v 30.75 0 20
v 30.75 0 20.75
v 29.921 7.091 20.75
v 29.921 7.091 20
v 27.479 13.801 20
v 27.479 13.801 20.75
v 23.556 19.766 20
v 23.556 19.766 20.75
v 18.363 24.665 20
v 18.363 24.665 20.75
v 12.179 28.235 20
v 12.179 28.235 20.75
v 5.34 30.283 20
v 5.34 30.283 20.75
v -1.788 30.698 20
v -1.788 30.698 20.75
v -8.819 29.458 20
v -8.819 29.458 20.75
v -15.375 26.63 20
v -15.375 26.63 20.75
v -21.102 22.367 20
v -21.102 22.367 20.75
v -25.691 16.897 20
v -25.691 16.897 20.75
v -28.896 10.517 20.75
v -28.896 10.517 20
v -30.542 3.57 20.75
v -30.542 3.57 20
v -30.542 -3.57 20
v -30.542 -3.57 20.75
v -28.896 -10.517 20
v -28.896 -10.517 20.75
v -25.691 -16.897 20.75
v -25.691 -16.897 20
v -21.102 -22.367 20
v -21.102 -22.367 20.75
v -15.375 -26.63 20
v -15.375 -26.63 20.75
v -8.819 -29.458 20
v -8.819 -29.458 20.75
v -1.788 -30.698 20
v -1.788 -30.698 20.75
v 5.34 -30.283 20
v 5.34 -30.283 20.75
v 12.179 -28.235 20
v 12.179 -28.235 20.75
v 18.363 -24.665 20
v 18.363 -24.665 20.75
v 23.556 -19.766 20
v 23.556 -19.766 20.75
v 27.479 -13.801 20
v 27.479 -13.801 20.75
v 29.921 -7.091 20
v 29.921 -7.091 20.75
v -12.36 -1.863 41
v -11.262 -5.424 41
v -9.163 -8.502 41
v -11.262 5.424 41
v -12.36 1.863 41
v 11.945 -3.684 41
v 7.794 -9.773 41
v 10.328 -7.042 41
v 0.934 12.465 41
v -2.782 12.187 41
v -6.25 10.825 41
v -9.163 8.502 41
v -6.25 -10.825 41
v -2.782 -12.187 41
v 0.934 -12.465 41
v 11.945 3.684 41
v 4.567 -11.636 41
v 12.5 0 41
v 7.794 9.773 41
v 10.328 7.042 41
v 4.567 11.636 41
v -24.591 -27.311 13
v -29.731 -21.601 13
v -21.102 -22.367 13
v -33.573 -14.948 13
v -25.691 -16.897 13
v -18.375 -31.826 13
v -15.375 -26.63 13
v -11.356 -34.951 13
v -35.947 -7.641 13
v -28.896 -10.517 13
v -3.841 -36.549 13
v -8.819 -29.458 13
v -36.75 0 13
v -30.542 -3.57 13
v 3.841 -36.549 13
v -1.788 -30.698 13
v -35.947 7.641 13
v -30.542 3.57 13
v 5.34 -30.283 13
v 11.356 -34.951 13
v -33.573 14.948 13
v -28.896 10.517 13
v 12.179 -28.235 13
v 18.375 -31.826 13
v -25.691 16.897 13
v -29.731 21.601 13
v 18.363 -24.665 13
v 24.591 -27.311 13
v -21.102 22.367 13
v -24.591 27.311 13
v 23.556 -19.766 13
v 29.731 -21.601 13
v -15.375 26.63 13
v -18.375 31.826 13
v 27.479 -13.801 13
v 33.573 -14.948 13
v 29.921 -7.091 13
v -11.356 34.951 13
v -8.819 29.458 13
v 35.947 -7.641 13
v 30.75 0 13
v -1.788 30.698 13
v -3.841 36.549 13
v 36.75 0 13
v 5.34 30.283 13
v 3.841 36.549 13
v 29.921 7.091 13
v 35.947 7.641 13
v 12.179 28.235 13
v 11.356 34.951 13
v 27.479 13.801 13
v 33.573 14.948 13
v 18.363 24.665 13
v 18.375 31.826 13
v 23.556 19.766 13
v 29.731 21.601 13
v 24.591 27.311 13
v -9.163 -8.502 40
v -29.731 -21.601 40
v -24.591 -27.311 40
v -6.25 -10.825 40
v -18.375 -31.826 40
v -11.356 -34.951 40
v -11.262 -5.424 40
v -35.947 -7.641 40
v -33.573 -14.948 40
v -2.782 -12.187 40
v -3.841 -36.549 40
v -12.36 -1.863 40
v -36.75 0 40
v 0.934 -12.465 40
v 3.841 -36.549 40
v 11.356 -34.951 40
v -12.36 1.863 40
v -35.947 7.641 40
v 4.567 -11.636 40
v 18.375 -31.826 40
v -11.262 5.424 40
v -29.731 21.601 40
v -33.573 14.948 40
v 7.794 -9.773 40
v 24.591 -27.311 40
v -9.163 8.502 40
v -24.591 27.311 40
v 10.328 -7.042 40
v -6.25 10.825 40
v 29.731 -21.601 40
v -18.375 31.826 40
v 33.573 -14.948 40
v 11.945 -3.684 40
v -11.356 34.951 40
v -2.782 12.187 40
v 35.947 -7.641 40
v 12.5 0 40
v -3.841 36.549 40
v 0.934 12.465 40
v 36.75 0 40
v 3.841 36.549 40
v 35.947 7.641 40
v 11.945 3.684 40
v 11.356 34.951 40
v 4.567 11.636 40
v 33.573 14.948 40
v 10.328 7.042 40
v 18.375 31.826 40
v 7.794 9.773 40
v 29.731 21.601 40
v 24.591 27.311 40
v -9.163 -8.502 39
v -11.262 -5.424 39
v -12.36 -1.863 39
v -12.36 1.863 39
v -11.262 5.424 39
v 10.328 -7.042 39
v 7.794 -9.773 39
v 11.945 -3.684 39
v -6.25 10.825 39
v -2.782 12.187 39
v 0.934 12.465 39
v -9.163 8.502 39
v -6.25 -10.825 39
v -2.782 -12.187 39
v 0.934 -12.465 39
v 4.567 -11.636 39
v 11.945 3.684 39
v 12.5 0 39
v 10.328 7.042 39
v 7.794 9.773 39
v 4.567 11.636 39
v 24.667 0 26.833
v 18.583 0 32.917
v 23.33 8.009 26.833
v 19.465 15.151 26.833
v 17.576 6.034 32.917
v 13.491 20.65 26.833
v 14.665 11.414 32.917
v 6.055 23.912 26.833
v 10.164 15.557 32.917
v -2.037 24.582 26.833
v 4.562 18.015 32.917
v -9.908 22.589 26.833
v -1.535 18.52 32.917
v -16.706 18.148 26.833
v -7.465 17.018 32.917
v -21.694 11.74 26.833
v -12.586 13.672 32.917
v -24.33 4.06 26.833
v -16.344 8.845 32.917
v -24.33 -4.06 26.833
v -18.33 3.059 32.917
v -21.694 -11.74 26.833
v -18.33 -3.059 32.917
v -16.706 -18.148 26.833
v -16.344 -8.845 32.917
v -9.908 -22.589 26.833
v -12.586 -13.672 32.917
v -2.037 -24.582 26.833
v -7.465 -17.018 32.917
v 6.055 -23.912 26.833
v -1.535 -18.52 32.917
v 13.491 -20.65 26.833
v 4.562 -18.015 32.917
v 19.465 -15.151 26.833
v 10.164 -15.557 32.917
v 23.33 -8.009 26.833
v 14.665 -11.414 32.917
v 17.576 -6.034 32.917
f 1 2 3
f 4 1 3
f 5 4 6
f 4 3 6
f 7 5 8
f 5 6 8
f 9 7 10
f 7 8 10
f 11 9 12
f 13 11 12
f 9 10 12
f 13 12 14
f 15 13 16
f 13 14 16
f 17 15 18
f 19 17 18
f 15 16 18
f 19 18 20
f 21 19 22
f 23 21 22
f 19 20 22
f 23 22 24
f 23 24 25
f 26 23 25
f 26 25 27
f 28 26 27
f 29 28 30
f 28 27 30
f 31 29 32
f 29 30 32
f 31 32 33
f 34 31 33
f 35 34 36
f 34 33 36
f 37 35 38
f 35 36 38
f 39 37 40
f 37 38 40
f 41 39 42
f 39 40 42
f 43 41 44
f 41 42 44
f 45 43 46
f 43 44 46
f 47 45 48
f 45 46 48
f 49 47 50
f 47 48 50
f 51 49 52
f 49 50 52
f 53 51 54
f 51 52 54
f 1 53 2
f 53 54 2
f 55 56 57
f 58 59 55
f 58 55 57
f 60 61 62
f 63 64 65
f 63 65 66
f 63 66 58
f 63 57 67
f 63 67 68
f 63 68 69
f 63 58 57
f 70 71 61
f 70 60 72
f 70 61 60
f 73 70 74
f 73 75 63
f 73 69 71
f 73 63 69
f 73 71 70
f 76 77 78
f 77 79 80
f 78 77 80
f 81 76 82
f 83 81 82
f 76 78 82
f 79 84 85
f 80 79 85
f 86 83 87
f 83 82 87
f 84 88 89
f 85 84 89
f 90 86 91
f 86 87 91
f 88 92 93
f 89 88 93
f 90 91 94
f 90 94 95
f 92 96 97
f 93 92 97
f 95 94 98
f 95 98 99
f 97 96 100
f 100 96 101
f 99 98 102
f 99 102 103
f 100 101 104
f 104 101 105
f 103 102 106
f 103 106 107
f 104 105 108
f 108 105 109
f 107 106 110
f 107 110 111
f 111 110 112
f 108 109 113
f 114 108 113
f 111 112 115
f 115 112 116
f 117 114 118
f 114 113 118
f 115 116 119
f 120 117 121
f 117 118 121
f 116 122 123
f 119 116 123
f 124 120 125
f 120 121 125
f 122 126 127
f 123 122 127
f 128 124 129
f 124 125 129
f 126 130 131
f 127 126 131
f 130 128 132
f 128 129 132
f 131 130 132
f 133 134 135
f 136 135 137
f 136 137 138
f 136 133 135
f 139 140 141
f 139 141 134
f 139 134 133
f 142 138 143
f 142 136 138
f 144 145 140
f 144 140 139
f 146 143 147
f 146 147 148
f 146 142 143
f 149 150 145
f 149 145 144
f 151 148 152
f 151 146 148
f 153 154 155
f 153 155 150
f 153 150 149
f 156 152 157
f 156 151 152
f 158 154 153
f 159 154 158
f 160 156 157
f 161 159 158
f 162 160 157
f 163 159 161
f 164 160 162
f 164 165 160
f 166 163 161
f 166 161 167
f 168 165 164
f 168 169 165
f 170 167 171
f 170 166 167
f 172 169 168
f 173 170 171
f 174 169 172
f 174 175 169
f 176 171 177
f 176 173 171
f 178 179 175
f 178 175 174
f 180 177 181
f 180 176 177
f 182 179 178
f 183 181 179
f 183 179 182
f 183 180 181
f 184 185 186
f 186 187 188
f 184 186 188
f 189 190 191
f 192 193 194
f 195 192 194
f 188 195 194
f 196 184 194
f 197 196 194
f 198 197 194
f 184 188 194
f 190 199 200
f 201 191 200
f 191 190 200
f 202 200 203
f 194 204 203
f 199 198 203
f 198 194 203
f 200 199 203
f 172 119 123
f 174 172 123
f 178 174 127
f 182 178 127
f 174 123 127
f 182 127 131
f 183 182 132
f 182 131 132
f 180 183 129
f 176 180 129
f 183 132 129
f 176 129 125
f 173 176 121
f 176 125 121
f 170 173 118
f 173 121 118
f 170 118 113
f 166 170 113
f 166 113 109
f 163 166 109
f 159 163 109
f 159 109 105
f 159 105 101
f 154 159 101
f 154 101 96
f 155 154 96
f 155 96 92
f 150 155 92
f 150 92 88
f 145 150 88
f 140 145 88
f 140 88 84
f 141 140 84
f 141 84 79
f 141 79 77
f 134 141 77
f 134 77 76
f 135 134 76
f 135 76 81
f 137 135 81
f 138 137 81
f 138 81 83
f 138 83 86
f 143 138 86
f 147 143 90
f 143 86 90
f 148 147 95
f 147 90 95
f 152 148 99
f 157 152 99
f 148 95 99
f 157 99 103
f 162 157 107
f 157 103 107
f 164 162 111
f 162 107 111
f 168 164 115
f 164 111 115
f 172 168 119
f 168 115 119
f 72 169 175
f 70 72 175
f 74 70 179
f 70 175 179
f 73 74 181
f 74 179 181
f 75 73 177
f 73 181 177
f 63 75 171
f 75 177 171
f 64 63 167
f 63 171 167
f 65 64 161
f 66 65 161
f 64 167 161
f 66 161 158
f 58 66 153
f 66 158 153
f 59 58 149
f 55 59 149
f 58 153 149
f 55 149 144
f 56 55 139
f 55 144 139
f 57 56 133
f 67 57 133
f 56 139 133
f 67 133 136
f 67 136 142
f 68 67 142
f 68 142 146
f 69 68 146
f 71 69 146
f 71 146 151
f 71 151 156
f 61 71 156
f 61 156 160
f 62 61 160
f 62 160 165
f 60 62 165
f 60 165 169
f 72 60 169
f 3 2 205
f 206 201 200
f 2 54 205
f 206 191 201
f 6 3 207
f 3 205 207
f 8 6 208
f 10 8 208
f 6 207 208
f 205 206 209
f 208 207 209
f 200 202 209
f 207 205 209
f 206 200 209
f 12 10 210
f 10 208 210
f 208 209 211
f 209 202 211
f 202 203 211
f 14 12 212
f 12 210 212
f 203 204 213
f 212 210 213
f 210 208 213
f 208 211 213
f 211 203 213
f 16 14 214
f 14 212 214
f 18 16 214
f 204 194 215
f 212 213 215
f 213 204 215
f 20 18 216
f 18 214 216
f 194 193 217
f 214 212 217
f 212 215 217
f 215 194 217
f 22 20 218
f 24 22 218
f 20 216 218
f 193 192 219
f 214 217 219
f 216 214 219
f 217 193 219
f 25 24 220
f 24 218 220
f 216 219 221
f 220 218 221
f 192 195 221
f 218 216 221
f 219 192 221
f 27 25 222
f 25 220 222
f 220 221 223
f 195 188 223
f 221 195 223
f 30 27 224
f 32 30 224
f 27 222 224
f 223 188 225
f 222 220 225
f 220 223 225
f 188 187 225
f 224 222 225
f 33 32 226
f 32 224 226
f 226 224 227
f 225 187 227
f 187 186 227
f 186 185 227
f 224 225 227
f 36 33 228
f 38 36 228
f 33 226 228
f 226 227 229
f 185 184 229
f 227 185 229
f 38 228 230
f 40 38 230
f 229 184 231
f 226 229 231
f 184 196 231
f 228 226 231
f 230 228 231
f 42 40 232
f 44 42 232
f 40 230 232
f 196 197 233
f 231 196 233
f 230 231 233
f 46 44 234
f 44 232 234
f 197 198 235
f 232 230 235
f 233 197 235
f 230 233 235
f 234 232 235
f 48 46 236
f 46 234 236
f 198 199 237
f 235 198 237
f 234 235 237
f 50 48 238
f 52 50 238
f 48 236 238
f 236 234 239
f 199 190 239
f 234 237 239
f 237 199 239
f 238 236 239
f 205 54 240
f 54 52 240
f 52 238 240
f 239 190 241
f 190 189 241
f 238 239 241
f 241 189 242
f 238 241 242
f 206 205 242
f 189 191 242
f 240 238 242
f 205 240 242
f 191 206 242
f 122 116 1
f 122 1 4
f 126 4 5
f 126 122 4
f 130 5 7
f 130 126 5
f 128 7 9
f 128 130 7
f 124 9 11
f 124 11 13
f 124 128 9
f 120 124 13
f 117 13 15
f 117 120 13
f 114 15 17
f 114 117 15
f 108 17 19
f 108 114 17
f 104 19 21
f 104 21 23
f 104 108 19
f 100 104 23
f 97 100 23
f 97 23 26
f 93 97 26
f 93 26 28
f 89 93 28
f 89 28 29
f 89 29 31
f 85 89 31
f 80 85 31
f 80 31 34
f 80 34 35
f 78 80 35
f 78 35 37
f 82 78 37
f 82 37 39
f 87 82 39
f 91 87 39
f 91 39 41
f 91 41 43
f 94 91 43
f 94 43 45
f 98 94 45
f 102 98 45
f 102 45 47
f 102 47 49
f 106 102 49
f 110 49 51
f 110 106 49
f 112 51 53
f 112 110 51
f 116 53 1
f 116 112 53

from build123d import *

# Parameters (mm, degrees)
F0_R        = 36.75
F0_R_2      = 30.75
F1_DEPTH    = 40
F2_START    = 20
F0_R_3      = 12.5
F2_DEPTH    = 20
F3_START    = 39
F3_DEPTH    = 2
F4_S5_R     = 30.75
F4_T6_DEPTH = 47
F5_DEPTH    = 13


# Not quite as in the source:
# - a fillet or chamfer that OpenCascade refuses, or shapes differently, is made with other operations: its cross-section is extruded or revolved along the edge and cut away or added


with BuildPart() as f1:
    # F0 (on Top) → F1 (new body)
    with BuildSketch(Plane.XY):
        Circle(F0_R)
        Circle(F0_R_2, mode=Mode.SUBTRACT)
    extrude(amount=F1_DEPTH)

    # F0 (on Top) → F2 (join)
    with BuildSketch(Plane.XY.offset(F2_START)):
        Circle(F0_R_2)
        Circle(F0_R_3, mode=Mode.SUBTRACT)
    extrude(amount=F2_DEPTH)

    # F0 (on Top) → F3 (join)
    with BuildSketch(Plane.XY.offset(F3_START)):
        Circle(F0_R_3)
    extrude(amount=F3_DEPTH)

    # F4: chamfer of 19 on 1 edges, made by hand


with BuildPart() as f4_tool2:
    # F4_s3 → F4_t4 (revolve)
    with BuildSketch(Plane.XZ):
        Polygon((31.5, 20), (12.5, 39), (12.5, 20), align=None)
    revolve(axis=Axis((0, 0, 20), (0, 0, 1)))

    # F4_s5 → F4_t6 (intersect, symmetric)
    with BuildSketch(Plane.XY.offset(29.5)):
        Circle(F4_S5_R)
    extrude(amount=F4_T6_DEPTH, both=True, mode=Mode.INTERSECT)

    split(bisect_by=Plane.XY.offset(39), keep=Keep.BOTTOM)


with BuildPart() as f1_1:
    add(f1.part)

    # F4_t1: cut F4_tool2
    add(f4_tool2.part, mode=Mode.SUBTRACT)

    # F5 (cut): a face of the model
    f5_faces = [f1_1.faces().sort_by_distance(p)[0] for p in [
        (-35.7105530317, 0, 0),
    ]]
    extrude(f5_faces, amount=-F5_DEPTH, mode=Mode.SUBTRACT)


solid = f1_1.part
